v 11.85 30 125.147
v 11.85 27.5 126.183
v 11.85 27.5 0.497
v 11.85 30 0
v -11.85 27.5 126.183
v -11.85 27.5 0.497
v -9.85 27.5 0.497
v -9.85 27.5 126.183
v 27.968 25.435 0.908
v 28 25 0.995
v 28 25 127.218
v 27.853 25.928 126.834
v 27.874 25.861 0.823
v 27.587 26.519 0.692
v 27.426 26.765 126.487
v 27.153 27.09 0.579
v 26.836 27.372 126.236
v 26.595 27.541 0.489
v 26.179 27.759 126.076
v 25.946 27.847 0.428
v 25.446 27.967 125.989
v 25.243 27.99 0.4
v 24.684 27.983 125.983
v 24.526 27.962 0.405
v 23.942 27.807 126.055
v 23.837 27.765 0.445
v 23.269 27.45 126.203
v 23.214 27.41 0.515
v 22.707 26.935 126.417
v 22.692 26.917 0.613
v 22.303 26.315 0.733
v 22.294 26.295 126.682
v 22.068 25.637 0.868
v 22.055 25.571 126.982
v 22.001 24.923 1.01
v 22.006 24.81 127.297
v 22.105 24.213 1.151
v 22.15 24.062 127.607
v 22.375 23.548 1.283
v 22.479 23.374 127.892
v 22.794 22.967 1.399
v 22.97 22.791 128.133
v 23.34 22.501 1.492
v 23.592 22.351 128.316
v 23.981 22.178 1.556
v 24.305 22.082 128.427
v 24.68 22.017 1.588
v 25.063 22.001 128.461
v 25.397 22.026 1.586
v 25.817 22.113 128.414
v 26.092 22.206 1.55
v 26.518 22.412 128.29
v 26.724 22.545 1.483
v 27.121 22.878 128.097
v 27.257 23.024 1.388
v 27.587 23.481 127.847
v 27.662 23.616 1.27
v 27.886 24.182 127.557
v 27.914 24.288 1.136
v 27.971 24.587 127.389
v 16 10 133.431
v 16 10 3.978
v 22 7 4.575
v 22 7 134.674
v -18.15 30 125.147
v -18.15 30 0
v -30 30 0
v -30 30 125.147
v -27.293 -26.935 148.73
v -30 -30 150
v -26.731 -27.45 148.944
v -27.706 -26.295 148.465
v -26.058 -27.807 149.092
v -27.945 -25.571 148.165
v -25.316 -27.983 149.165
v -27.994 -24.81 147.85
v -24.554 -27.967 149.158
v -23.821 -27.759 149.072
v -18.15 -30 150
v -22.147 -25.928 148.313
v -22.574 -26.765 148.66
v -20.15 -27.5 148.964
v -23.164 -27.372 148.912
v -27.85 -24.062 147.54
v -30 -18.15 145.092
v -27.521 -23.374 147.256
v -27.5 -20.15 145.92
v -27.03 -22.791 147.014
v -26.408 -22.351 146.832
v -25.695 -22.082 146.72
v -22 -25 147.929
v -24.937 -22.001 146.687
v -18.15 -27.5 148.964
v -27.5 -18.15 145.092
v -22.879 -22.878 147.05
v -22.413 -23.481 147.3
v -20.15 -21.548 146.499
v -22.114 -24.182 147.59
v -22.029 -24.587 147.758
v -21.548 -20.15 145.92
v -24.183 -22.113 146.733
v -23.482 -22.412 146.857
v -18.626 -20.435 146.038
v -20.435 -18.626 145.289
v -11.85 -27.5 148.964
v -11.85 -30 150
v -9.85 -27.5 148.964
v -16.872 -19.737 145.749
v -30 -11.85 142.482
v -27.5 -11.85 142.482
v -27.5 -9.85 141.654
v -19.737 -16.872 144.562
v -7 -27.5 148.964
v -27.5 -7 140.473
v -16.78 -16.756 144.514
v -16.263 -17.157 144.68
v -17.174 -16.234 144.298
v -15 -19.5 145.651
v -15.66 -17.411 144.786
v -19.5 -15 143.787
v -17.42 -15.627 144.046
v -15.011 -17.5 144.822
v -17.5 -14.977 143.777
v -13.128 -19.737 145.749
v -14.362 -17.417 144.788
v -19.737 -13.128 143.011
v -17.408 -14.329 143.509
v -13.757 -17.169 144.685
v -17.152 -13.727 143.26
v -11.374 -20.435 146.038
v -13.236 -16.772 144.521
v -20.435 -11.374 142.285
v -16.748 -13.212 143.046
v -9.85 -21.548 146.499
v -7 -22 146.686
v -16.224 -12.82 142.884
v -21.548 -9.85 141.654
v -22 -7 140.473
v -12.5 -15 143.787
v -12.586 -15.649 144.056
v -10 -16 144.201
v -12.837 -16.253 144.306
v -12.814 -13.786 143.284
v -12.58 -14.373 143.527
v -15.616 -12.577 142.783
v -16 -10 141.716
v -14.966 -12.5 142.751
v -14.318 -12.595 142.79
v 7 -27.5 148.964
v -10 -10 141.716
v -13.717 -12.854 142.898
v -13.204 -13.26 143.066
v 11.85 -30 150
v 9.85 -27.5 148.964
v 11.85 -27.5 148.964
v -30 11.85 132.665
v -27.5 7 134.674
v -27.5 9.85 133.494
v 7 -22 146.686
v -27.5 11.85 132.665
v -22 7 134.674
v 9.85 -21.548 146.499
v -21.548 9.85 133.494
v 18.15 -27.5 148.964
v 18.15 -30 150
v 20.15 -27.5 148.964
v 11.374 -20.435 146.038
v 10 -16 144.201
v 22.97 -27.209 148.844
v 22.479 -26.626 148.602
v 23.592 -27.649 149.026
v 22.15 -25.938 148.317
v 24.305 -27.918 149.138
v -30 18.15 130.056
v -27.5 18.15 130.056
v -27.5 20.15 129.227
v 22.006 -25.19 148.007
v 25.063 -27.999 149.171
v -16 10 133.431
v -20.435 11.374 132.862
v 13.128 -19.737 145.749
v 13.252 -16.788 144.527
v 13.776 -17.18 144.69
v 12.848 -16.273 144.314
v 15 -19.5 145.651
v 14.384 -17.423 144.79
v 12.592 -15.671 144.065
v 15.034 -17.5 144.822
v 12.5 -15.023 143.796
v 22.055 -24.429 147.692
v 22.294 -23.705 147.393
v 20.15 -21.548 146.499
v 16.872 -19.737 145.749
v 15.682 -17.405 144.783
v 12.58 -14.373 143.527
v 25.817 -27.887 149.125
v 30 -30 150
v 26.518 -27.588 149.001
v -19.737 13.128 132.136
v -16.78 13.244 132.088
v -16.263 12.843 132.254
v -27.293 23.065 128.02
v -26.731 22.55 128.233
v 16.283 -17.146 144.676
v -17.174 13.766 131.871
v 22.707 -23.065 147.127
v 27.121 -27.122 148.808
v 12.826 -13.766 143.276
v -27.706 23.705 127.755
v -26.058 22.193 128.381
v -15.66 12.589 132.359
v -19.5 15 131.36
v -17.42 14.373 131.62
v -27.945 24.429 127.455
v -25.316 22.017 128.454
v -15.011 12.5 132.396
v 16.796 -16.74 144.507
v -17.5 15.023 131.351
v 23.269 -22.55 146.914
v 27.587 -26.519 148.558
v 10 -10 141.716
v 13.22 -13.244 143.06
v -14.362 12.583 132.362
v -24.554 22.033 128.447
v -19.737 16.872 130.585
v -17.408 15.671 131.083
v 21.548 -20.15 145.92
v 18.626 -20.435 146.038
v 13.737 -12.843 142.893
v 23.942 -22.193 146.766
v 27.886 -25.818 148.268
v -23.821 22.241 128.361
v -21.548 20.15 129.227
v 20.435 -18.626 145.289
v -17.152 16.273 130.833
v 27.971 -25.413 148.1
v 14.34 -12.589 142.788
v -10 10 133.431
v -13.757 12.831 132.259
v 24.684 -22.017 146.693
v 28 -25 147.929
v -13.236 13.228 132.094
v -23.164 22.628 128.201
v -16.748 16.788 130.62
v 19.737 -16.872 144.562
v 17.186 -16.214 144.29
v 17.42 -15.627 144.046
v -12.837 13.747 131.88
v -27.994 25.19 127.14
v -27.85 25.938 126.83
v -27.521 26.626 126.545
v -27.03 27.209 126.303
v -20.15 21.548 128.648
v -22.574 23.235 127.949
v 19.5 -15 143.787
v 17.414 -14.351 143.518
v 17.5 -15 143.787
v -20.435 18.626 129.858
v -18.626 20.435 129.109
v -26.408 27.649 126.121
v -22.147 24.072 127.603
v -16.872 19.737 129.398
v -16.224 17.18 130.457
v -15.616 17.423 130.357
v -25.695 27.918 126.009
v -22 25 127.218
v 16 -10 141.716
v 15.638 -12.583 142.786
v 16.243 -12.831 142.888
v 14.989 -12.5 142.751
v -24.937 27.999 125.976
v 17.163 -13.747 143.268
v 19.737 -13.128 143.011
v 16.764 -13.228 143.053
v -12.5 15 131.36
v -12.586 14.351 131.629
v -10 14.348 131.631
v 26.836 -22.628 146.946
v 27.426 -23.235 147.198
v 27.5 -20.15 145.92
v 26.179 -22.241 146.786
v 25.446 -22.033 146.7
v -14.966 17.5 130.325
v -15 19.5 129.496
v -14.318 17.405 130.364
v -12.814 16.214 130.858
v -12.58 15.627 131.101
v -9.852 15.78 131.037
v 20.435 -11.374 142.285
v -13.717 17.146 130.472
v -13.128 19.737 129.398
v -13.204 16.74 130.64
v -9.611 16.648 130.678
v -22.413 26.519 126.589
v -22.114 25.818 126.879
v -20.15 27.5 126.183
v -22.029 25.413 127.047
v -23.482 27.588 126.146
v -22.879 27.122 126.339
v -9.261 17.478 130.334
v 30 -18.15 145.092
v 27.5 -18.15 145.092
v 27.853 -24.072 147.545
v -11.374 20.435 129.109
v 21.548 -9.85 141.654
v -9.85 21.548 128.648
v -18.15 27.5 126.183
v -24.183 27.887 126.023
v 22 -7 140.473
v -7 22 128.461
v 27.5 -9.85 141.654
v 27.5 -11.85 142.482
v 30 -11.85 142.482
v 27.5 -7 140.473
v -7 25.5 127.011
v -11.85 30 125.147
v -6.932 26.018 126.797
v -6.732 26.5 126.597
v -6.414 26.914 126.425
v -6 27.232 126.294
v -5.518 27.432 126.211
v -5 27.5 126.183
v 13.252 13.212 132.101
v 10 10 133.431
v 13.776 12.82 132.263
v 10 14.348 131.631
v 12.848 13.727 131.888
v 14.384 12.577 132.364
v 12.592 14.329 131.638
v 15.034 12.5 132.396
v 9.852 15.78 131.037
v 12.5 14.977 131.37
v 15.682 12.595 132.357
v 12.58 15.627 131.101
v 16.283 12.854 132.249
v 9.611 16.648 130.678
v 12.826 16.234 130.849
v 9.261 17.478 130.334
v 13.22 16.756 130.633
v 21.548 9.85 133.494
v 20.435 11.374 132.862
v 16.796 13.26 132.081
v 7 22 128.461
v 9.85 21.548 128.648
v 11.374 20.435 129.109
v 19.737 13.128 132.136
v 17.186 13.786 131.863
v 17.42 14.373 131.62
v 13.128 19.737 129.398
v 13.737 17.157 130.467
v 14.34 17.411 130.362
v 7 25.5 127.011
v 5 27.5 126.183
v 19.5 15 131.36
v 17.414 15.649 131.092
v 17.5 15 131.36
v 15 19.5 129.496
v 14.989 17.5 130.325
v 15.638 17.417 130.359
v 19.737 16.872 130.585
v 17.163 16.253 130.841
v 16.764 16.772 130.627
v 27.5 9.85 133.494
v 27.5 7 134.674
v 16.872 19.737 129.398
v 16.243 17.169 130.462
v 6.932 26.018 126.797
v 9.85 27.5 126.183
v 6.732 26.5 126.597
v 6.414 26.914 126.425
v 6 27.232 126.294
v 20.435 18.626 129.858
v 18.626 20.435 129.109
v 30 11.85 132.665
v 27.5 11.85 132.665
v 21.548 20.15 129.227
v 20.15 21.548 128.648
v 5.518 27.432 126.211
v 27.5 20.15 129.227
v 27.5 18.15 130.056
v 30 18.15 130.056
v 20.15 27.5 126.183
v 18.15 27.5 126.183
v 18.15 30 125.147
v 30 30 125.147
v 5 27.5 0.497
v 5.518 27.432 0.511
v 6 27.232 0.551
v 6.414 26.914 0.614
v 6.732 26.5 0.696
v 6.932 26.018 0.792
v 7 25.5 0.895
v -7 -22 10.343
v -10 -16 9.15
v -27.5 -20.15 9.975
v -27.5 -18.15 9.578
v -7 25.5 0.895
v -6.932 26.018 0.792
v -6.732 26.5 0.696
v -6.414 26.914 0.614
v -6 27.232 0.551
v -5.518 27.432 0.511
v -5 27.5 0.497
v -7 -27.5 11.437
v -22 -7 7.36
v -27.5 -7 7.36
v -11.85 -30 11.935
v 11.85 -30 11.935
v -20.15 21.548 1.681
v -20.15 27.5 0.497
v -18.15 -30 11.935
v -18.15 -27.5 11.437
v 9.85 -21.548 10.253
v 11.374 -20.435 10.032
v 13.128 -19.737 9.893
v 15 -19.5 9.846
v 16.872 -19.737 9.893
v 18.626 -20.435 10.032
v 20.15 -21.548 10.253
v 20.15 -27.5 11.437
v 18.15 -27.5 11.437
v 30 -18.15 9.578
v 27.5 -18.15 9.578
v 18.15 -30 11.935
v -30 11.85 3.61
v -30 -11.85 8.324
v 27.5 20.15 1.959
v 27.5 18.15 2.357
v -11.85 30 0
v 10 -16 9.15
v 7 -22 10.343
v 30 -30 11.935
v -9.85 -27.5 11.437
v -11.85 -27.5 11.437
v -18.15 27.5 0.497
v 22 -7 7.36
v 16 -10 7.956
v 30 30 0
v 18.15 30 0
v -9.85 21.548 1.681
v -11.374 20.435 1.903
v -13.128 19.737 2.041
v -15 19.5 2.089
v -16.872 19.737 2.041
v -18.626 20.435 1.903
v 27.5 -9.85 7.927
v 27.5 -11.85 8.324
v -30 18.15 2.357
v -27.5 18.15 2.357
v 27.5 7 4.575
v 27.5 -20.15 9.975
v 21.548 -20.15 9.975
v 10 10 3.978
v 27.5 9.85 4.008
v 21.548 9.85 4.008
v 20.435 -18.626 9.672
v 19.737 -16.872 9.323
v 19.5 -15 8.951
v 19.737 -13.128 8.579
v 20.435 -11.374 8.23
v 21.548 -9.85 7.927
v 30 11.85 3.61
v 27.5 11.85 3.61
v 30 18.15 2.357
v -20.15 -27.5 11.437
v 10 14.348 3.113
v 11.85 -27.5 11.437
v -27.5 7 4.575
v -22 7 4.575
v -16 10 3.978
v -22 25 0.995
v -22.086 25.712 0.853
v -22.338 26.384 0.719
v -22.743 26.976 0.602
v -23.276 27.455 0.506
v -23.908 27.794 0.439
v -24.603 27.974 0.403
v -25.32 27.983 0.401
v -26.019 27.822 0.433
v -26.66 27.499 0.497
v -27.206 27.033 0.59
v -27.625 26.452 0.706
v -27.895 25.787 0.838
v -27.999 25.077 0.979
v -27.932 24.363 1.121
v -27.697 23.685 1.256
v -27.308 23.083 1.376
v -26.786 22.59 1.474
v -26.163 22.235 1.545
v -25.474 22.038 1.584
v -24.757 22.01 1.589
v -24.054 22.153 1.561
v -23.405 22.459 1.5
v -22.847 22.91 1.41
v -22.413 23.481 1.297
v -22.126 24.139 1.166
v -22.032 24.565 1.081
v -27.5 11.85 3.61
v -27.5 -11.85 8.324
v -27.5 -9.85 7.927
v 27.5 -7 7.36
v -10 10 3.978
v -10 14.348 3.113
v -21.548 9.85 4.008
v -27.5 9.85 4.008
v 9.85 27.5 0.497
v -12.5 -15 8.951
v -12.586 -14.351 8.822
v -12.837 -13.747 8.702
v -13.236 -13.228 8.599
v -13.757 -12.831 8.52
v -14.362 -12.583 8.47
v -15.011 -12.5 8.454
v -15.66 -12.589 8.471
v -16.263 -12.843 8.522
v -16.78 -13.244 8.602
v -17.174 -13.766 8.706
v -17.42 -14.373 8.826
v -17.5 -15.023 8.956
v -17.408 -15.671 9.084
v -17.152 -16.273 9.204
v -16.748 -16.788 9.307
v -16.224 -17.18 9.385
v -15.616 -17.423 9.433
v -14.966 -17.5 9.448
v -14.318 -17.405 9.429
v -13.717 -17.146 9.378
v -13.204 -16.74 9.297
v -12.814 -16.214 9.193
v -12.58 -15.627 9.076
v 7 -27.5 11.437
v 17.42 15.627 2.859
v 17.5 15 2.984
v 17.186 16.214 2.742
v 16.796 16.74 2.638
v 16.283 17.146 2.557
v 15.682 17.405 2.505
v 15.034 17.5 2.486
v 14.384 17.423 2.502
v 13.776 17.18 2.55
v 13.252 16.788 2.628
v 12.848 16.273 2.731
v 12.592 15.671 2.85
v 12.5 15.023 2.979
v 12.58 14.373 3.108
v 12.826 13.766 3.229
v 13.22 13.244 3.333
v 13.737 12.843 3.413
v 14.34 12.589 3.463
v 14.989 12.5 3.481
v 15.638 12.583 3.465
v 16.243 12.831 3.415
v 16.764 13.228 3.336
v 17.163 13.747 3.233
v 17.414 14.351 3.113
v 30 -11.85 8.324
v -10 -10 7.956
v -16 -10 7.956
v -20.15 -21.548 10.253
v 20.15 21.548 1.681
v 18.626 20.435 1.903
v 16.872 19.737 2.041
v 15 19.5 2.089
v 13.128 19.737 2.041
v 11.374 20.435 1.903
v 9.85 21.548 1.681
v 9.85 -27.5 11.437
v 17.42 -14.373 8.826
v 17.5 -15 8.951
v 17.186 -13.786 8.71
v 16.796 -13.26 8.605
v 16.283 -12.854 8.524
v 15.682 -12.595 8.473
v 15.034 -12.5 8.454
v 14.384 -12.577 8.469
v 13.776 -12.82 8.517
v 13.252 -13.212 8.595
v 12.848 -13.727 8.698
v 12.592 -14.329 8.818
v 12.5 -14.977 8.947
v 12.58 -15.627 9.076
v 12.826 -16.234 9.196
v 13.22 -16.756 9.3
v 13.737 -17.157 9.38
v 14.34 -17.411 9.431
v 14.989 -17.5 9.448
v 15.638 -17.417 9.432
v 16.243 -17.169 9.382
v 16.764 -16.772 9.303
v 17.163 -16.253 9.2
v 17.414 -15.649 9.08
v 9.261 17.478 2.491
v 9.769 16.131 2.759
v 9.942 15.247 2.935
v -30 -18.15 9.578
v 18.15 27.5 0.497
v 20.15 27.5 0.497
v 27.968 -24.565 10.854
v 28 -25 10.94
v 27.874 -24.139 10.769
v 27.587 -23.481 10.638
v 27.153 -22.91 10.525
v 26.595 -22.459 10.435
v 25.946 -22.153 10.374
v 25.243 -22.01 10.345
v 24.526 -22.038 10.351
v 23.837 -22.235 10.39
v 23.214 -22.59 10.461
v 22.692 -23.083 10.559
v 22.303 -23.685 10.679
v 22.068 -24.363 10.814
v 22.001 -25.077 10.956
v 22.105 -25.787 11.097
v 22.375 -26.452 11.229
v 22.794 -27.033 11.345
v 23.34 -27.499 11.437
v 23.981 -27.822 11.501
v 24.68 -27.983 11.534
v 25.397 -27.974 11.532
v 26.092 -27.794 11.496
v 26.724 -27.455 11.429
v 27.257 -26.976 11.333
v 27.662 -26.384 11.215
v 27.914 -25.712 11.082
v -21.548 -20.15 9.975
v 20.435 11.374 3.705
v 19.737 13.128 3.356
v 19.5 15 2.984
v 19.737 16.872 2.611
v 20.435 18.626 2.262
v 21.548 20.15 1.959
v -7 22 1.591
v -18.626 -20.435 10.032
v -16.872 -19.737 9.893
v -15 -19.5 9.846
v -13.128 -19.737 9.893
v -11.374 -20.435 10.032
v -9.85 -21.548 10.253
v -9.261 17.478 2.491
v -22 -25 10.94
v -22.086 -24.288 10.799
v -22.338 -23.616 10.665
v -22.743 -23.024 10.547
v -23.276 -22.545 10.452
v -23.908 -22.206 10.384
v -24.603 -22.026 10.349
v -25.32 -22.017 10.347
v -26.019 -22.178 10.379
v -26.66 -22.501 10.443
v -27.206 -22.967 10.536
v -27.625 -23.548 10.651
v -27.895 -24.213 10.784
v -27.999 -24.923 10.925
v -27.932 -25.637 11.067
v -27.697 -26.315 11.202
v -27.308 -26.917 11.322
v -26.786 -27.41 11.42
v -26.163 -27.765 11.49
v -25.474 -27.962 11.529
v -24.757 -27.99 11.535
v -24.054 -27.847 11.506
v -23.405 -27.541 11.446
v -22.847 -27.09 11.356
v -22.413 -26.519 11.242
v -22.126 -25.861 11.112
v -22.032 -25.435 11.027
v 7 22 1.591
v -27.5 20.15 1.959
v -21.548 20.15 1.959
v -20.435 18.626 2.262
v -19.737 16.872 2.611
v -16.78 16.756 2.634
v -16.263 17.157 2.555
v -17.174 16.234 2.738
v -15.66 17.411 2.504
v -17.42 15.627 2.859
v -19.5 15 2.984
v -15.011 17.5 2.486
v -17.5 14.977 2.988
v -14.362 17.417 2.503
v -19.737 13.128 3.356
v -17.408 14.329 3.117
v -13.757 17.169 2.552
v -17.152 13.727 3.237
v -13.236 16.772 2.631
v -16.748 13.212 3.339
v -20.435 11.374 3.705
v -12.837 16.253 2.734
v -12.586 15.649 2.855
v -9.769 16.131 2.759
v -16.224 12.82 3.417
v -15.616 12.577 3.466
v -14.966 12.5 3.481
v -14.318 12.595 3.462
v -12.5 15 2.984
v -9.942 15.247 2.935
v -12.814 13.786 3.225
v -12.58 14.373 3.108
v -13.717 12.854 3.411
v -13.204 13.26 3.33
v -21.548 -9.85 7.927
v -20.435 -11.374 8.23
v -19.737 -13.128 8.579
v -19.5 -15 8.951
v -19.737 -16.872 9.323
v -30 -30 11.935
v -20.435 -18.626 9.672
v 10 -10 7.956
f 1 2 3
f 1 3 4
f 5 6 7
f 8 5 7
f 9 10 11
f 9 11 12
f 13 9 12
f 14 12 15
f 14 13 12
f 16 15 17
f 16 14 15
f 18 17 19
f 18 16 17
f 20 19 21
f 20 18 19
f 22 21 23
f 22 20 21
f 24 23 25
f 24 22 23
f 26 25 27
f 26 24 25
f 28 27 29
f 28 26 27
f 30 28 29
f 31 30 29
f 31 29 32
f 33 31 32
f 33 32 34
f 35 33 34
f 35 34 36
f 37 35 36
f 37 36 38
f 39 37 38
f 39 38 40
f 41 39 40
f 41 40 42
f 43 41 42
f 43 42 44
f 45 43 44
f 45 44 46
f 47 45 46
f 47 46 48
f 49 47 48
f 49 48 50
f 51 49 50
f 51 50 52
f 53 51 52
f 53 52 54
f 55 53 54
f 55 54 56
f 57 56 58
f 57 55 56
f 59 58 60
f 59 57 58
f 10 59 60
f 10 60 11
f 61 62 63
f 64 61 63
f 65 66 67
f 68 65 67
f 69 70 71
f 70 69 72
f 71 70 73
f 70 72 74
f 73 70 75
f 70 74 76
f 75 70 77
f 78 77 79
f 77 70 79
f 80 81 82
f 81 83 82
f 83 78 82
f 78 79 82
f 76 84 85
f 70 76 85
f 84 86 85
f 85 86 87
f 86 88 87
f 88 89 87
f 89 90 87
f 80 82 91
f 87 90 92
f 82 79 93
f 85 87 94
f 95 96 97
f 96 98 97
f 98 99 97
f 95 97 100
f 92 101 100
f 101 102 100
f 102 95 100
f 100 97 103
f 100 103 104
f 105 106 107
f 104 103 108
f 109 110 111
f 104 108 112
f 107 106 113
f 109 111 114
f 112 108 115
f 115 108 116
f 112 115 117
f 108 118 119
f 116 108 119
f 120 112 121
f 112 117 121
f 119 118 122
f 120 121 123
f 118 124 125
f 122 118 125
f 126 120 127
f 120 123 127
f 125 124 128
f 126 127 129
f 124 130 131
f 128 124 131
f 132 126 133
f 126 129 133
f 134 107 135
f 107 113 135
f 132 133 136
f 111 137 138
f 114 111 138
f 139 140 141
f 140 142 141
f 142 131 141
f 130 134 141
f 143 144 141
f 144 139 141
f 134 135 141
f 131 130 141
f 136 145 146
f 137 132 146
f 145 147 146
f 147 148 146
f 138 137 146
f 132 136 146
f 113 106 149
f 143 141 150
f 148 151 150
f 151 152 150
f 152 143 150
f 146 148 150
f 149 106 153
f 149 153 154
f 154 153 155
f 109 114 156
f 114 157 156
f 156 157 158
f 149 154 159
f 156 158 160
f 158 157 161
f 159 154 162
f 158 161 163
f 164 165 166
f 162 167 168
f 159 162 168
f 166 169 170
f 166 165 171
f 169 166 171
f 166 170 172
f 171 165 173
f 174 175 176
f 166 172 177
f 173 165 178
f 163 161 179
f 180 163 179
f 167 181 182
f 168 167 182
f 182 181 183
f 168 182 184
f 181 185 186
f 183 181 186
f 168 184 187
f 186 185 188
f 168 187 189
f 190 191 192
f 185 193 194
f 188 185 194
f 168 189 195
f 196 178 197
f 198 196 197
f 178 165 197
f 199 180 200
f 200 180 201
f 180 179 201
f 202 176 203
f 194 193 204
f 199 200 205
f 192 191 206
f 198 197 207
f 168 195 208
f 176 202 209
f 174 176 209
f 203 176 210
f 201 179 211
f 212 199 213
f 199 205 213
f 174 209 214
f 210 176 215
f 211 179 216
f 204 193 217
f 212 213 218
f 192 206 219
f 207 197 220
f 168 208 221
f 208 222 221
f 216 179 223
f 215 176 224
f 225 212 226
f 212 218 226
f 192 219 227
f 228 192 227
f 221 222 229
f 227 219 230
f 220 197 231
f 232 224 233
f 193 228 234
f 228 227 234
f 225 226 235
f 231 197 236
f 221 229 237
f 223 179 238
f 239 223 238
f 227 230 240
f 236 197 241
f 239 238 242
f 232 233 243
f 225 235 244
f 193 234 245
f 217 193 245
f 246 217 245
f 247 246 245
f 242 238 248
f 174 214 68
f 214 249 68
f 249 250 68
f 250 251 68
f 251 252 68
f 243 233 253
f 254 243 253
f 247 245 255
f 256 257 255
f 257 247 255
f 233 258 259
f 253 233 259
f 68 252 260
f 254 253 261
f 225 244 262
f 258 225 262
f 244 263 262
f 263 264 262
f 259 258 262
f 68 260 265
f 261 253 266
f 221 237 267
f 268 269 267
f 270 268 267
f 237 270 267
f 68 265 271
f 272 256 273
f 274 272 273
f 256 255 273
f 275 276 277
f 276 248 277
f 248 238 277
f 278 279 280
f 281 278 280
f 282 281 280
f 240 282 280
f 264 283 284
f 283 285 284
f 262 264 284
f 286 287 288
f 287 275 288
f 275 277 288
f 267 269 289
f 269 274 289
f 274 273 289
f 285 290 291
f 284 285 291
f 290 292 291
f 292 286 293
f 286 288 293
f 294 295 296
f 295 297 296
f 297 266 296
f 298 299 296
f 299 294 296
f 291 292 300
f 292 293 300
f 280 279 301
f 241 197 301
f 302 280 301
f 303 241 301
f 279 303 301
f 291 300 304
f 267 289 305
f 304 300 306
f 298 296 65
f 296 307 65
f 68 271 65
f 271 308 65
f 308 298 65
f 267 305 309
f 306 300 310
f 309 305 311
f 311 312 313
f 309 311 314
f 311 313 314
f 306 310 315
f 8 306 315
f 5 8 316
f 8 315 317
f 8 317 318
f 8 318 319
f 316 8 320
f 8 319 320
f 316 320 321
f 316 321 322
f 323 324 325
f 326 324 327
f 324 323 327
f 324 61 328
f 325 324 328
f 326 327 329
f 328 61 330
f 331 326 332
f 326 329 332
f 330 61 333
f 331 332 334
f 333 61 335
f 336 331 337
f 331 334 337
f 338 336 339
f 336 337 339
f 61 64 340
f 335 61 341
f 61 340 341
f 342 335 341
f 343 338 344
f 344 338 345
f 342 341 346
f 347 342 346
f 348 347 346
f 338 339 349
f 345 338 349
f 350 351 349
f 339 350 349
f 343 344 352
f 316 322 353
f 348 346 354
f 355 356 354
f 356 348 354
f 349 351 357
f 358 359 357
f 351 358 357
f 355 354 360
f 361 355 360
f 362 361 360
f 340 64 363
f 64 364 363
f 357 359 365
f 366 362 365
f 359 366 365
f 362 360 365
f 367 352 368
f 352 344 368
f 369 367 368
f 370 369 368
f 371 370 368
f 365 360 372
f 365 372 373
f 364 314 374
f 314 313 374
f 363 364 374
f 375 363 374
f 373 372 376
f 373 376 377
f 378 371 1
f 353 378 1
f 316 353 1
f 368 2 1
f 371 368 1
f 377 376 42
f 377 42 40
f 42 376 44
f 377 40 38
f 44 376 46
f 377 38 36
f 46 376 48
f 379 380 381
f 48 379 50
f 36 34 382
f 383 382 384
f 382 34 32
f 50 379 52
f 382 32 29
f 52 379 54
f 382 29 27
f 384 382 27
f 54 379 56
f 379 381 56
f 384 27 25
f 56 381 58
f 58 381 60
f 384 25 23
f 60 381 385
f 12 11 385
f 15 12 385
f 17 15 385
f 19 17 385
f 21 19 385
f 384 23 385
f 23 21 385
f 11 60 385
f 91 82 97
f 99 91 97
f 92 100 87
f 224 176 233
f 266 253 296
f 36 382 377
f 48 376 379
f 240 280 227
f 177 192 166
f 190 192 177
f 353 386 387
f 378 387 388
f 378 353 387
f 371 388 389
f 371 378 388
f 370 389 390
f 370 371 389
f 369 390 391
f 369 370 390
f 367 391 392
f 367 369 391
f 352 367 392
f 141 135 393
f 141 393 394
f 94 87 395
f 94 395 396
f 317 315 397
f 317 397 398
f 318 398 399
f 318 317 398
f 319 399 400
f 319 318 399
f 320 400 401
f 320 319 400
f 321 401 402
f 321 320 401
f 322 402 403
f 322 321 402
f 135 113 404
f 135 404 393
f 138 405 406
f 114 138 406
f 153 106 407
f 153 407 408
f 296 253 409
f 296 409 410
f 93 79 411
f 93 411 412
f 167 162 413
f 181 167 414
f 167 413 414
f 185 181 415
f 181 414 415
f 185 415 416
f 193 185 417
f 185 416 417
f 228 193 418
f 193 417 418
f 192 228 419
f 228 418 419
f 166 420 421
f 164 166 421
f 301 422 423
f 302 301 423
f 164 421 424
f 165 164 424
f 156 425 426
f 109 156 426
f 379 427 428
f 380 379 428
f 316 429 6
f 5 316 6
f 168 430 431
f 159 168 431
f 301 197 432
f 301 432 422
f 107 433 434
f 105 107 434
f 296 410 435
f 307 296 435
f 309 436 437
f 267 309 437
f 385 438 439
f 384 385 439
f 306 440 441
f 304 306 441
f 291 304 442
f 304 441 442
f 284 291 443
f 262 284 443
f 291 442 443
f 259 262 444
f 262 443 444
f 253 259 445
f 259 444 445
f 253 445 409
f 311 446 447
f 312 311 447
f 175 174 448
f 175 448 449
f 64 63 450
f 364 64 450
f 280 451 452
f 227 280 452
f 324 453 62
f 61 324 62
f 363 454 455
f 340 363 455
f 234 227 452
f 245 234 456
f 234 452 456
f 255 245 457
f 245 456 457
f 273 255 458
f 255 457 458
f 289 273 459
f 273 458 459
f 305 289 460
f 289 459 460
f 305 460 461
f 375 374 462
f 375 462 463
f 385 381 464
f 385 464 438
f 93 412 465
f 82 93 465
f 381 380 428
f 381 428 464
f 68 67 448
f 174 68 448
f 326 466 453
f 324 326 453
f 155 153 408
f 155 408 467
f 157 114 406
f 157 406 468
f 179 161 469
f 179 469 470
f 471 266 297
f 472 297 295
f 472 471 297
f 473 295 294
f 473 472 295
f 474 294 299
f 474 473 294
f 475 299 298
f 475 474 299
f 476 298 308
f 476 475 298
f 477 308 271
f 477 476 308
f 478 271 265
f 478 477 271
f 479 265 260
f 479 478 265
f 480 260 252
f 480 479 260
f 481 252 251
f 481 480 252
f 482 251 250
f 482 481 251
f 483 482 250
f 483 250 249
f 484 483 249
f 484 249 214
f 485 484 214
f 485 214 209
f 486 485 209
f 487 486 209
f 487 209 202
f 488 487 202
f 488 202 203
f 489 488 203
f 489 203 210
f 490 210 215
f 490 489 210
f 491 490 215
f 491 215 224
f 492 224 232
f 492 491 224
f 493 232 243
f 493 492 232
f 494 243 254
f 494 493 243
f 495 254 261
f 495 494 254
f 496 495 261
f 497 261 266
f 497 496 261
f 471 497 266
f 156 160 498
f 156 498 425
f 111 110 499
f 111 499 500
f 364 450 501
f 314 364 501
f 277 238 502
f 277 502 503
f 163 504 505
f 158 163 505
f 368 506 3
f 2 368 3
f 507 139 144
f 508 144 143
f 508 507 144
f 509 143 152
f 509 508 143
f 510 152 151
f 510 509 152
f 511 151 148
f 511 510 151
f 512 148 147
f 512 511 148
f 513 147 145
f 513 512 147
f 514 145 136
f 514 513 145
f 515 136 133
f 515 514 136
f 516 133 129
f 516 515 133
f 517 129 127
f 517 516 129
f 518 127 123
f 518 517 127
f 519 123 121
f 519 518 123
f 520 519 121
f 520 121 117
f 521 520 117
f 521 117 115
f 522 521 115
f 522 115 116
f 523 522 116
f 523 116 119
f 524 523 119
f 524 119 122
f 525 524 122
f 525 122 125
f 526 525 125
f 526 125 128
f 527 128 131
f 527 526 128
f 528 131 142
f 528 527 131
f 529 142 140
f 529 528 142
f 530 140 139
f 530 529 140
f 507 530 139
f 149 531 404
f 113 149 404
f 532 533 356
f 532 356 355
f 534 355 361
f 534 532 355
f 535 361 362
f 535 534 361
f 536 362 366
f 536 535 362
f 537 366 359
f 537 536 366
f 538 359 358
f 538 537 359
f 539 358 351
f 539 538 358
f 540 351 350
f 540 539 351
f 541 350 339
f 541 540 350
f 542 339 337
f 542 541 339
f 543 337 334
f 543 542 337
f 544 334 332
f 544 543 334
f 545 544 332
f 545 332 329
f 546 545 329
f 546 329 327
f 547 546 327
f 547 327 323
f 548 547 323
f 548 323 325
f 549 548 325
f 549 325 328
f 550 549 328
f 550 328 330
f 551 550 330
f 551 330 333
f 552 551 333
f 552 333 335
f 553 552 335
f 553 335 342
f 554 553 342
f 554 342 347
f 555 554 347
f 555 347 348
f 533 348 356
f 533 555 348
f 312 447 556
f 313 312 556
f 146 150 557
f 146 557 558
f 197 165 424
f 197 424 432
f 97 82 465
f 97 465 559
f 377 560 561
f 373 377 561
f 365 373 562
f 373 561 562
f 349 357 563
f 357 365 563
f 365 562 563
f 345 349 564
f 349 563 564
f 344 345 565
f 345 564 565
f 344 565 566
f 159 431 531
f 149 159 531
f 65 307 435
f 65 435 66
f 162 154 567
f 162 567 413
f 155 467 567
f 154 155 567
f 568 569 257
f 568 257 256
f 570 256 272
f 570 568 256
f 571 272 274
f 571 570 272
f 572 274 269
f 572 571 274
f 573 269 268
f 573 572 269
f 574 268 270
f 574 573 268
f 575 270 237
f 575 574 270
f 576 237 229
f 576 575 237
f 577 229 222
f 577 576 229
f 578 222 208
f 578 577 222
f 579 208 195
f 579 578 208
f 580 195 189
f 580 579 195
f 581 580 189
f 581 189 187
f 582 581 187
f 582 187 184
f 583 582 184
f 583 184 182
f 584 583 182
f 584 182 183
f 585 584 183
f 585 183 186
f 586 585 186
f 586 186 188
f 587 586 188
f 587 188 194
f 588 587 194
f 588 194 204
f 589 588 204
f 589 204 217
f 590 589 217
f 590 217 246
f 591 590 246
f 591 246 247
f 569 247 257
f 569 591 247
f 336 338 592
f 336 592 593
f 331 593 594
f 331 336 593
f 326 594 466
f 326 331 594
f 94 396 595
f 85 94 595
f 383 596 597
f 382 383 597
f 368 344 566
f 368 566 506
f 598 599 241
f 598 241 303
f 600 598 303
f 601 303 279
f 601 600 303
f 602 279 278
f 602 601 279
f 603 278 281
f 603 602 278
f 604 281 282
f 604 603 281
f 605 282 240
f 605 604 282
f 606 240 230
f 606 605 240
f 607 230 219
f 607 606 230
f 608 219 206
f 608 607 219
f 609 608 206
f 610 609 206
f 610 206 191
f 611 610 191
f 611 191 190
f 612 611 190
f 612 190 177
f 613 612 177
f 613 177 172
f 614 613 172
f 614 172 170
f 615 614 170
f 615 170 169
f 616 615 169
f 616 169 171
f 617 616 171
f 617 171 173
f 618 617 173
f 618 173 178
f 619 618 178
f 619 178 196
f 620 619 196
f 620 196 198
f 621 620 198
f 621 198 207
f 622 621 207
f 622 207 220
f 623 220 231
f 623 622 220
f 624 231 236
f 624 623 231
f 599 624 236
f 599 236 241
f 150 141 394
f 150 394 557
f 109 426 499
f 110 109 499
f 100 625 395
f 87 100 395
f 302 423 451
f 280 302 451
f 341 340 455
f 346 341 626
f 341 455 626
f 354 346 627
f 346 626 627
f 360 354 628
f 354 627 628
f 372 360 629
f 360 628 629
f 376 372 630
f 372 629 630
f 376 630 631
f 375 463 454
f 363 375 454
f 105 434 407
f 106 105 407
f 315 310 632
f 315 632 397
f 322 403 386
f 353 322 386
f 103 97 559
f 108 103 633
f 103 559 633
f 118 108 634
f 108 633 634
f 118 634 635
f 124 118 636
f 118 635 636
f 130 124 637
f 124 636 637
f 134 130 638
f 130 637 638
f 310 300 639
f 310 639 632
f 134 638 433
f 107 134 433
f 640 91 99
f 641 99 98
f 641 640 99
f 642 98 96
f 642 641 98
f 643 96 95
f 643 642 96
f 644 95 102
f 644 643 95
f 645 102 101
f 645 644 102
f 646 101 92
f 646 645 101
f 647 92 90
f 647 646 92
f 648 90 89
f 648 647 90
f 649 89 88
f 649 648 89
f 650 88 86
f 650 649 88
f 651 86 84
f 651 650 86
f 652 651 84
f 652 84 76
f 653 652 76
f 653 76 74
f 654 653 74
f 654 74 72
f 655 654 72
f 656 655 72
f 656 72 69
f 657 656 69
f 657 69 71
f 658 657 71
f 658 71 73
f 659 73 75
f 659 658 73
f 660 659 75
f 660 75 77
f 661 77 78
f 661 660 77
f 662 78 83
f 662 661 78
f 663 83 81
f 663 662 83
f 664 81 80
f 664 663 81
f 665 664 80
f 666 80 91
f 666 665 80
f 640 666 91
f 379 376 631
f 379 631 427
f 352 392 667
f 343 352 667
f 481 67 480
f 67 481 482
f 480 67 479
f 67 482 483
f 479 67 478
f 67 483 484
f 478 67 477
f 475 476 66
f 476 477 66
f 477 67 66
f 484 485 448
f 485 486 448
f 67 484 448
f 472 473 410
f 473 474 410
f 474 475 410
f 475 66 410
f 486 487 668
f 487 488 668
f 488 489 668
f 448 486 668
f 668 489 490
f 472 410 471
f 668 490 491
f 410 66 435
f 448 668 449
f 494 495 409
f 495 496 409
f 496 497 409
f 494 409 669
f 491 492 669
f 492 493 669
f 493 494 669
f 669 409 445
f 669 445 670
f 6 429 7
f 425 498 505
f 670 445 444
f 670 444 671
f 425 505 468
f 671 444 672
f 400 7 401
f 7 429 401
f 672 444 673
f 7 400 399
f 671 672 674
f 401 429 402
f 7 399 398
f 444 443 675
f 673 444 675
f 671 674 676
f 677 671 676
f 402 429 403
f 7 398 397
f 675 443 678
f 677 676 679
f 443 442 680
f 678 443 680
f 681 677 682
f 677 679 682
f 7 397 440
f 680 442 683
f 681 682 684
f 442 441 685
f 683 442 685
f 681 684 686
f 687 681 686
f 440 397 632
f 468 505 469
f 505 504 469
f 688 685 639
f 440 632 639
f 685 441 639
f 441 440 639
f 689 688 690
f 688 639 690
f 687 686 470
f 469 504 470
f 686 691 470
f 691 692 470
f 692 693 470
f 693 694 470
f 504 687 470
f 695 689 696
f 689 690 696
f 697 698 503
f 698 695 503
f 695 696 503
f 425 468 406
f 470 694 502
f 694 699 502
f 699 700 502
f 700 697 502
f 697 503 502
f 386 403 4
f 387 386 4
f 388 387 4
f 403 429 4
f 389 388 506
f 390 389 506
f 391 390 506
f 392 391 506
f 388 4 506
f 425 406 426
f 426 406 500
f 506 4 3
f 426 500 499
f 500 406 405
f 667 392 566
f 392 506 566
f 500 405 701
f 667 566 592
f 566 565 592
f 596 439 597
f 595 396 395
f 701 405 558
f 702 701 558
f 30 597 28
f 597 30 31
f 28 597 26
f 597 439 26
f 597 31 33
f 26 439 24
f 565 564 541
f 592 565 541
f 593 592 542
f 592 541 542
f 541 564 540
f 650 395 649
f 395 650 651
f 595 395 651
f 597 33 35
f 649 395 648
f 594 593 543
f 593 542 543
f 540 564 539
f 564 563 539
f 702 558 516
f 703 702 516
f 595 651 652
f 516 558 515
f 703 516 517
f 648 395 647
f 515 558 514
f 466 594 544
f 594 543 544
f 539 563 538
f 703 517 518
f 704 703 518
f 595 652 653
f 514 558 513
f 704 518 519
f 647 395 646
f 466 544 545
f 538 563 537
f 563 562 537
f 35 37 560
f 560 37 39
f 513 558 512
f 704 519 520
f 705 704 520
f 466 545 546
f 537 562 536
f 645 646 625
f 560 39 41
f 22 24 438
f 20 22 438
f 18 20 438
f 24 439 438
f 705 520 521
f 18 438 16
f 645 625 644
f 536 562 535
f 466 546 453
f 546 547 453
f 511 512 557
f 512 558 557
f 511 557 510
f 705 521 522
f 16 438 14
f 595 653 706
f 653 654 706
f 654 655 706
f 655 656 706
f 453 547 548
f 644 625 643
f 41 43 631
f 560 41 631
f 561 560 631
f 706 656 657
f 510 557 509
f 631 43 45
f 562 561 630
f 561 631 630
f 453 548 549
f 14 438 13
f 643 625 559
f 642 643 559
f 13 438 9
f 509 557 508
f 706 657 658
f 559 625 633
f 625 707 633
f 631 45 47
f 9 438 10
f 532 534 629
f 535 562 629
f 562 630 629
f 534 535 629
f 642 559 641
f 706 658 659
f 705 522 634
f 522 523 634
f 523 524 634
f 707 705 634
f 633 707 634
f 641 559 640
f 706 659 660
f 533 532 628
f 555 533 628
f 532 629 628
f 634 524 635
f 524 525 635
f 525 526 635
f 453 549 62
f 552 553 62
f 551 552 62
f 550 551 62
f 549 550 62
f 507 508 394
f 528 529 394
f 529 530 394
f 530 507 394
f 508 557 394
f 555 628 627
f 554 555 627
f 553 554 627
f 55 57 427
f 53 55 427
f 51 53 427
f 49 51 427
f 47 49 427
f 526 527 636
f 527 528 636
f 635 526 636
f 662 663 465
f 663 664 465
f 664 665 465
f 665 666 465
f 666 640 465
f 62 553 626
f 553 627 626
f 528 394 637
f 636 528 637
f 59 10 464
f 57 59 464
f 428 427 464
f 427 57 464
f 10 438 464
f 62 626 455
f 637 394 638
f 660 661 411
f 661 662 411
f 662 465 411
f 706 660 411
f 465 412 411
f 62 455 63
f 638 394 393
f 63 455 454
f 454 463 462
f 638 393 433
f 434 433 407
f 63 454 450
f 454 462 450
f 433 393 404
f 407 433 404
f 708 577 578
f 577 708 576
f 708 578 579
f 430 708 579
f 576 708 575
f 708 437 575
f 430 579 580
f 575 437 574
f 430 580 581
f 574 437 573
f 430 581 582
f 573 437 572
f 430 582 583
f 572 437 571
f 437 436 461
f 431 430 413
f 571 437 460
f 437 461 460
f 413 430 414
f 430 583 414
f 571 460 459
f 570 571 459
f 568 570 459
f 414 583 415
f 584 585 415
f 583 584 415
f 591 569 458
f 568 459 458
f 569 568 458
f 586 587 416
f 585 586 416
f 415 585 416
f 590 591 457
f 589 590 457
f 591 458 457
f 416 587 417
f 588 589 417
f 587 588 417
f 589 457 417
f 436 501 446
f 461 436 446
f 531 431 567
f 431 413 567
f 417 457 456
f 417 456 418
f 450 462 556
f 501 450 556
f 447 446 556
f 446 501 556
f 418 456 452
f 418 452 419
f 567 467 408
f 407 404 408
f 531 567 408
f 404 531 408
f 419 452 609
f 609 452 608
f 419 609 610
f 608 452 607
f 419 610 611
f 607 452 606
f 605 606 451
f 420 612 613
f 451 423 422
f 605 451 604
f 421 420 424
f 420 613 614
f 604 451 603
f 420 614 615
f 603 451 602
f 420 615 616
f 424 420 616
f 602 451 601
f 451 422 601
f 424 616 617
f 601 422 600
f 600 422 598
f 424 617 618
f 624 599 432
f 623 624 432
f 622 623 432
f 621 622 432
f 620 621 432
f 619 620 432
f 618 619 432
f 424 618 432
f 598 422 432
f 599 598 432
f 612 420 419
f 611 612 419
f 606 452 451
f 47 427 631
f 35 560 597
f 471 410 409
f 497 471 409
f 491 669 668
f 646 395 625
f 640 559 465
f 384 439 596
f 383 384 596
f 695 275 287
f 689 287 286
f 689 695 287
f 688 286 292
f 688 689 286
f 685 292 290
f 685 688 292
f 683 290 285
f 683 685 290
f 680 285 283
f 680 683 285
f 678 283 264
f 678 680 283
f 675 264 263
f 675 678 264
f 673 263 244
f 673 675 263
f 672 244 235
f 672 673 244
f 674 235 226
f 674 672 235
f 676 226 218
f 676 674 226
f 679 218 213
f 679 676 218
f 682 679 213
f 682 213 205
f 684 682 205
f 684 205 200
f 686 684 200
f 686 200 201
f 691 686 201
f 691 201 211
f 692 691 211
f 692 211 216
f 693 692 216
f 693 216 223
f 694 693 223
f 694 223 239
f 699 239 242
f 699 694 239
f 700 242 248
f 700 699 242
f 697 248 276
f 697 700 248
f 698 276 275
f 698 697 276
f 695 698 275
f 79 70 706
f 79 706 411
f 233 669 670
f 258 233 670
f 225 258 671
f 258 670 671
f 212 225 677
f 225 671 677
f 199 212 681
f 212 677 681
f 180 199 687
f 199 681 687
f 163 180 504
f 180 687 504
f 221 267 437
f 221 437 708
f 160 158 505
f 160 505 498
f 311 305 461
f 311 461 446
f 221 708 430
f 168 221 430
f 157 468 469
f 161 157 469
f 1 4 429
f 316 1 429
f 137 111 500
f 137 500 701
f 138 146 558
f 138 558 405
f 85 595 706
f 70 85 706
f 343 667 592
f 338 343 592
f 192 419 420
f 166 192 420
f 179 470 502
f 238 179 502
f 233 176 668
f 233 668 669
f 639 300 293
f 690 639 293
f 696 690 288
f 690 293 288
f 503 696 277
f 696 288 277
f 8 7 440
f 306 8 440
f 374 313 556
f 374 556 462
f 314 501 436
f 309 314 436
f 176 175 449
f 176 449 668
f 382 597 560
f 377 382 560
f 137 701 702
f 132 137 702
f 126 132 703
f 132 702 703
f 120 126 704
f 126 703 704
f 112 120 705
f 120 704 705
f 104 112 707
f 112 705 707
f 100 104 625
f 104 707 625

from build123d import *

# Parameters (mm, degrees)
F0_R          = 3
F0_R_2        = 2.5
F1_DEPTH      = 150
F2_R          = 2
F3_R          = 7
F6_DEPTH      = 30
F6_DEPTH_BACK = 30


# Not quite as in the source:
# - a feature names something its author has since deleted; it is built from what else it names


with BuildPart() as f1:
    # F0 (on Top) → F1 (new body)
    with BuildSketch(Plane.XY):
        with BuildLine():
            Line((18.15, -30), (30, -30))
            Line((30, -30), (30, -18.15))
            Line((30, -18.15), (27.5, -18.15))
            Line((27.5, -18.15), (27.5, -20.15))
            Line((27.5, -20.15), (21.5477069044, -20.15))
            ThreePointArc((21.5477069044, -20.15), (19.5, -15), (21.5477069044, -9.85))
            Line((21.5477069044, -9.85), (27.5, -9.85))
            Line((27.5, -9.85), (27.5, -11.85))
            Line((27.5, -11.85), (30, -11.85))
            Line((30, -11.85), (30, 11.85))
            Line((30, 11.85), (27.5, 11.85))
            Line((27.5, 11.85), (27.5, 9.85))
            Line((27.5, 9.85), (21.5477069044, 9.85))
            ThreePointArc((21.5477069044, 9.85), (19.5, 15), (21.5477069044, 20.15))
            Line((21.5477069044, 20.15), (27.5, 20.15))
            Line((27.5, 20.15), (27.5, 18.15))
            Line((27.5, 18.15), (30, 18.15))
            Line((30, 18.15), (30, 30))
            Line((30, 30), (18.15, 30))
            Line((18.15, 30), (18.15, 27.5))
            Line((18.15, 27.5), (20.15, 27.5))
            Line((20.15, 27.5), (20.15, 21.5477069044))
            ThreePointArc((20.15, 21.5477069044), (15, 19.5), (9.85, 21.5477069044))
            Line((9.85, 21.5477069044), (9.85, 27.5))
            Line((9.85, 27.5), (11.85, 27.5))
            Line((11.85, 27.5), (11.85, 30))
            Line((11.85, 30), (-11.85, 30))
            Line((-11.85, 30), (-11.85, 27.5))
            Line((-11.85, 27.5), (-9.85, 27.5))
            Line((-9.85, 27.5), (-9.85, 21.5477069044))
            ThreePointArc((-9.85, 21.5477069044), (-15, 19.5), (-20.15, 21.5477069044))
            Line((-20.15, 21.5477069044), (-20.15, 27.5))
            Line((-20.15, 27.5), (-18.15, 27.5))
            Line((-18.15, 27.5), (-18.15, 30))
            Line((-18.15, 30), (-30, 30))
            Line((-30, 30), (-30, 18.15))
            Line((-30, 18.15), (-27.5, 18.15))
            Line((-27.5, 18.15), (-27.5, 20.15))
            Line((-27.5, 20.15), (-21.5477069044, 20.15))
            ThreePointArc((-21.5477069044, 20.15), (-19.5, 15), (-21.5477069044, 9.85))
            Line((-21.5477069044, 9.85), (-27.5, 9.85))
            Line((-27.5, 9.85), (-27.5, 11.85))
            Line((-27.5, 11.85), (-30, 11.85))
            Line((-30, 11.85), (-30, -11.85))
            Line((-30, -11.85), (-27.5, -11.85))
            Line((-27.5, -11.85), (-27.5, -9.85))
            Line((-27.5, -9.85), (-21.5477069044, -9.85))
            ThreePointArc((-21.5477069044, -9.85), (-19.5, -15), (-21.5477069044, -20.15))
            Line((-21.5477069044, -20.15), (-27.5, -20.15))
            Line((-27.5, -20.15), (-27.5, -18.15))
            Line((-27.5, -18.15), (-30, -18.15))
            Line((-30, -18.15), (-30, -30))
            Line((-30, -30), (-18.15, -30))
            Line((-18.15, -30), (-18.15, -27.5))
            Line((-18.15, -27.5), (-20.15, -27.5))
            Line((-20.15, -27.5), (-20.15, -21.5477069044))
            ThreePointArc((-20.15, -21.5477069044), (-15, -19.5), (-9.85, -21.5477069044))
            Line((-9.85, -21.5477069044), (-9.85, -27.5))
            Line((-9.85, -27.5), (-11.85, -27.5))
            Line((-11.85, -27.5), (-11.85, -30))
            Line((-11.85, -30), (11.85, -30))
            Line((11.85, -30), (11.85, -27.5))
            Line((11.85, -27.5), (9.85, -27.5))
            Line((9.85, -27.5), (9.85, -21.5477069044))
            ThreePointArc((9.85, -21.5477069044), (15, -19.5), (20.15, -21.5477069044))
            Line((20.15, -21.5477069044), (20.15, -27.5))
            Line((20.15, -27.5), (18.15, -27.5))
            Line((18.15, -27.5), (18.15, -30))
        make_face()
        with Locations((-25, -25)):
            Circle(F0_R, mode=Mode.SUBTRACT)
        with Locations((-15, -15)):
            Circle(F0_R_2, mode=Mode.SUBTRACT)
        with Locations((25, -25)):
            Circle(F0_R, mode=Mode.SUBTRACT)
        with Locations((15, -15)):
            Circle(F0_R_2, mode=Mode.SUBTRACT)
        with Locations((-25, 25)):
            Circle(F0_R, mode=Mode.SUBTRACT)
        with Locations((-15, 15)):
            Circle(F0_R_2, mode=Mode.SUBTRACT)
        Polygon((-7, 22), (-7, 27.5), (0, 27.5), (7, 27.5), (7, 22), (10, 16), (10, 10), (16, 10), (22, 7), (27.5, 7), (27.5, 0), (27.5, -7), (22, -7), (16, -10), (10, -10), (10, -16), (7, -22), (7, -27.5), (0, -27.5), (-7, -27.5), (-7, -22), (-10, -16), (-10, -10), (-16, -10), (-22, -7), (-27.5, -7), (-27.5, 0), (-27.5, 7), (-22, 7), (-16, 10), (-10, 10), (-10, 16), align=None, mode=Mode.SUBTRACT)
        with Locations((15, 15)):
            Circle(F0_R_2, mode=Mode.SUBTRACT)
        with Locations((25, 25)):
            Circle(F0_R, mode=Mode.SUBTRACT)
    extrude(amount=F1_DEPTH)

    # F2
    f2_edges = [f1.edges().sort_by_distance(p)[0] for p in [
        (-7, 27.5, 75),
        (7, 27.5, 75),
    ]]
    fillet(f2_edges, radius=F2_R)

    # F3
    f3_edges = [f1.edges().sort_by_distance(p)[0] for p in [
        (-10, 16, 75),
        (10, 16, 75),
    ]]
    fillet(f3_edges, radius=F3_R)

    # F5 (on Right) → F6 (cut, two sides)
    with BuildSketch(Plane.YZ) as f6_sk:
        Polygon((14.9420964297, -75.7011932878), (30, 0), (-77.5301070084, 21.3890681496), (-92.5880105787, -54.3121251382), align=None)
        Polygon((89.181769874, 100.6332945306), (123.8334032044, 184.2897376752), (4.6516333304, 233.6564431446), (-30, 150), align=None)
    extrude(amount=F6_DEPTH, mode=Mode.SUBTRACT)
    extrude(f6_sk.sketch, amount=-F6_DEPTH_BACK, mode=Mode.SUBTRACT)


solid = f1.part
